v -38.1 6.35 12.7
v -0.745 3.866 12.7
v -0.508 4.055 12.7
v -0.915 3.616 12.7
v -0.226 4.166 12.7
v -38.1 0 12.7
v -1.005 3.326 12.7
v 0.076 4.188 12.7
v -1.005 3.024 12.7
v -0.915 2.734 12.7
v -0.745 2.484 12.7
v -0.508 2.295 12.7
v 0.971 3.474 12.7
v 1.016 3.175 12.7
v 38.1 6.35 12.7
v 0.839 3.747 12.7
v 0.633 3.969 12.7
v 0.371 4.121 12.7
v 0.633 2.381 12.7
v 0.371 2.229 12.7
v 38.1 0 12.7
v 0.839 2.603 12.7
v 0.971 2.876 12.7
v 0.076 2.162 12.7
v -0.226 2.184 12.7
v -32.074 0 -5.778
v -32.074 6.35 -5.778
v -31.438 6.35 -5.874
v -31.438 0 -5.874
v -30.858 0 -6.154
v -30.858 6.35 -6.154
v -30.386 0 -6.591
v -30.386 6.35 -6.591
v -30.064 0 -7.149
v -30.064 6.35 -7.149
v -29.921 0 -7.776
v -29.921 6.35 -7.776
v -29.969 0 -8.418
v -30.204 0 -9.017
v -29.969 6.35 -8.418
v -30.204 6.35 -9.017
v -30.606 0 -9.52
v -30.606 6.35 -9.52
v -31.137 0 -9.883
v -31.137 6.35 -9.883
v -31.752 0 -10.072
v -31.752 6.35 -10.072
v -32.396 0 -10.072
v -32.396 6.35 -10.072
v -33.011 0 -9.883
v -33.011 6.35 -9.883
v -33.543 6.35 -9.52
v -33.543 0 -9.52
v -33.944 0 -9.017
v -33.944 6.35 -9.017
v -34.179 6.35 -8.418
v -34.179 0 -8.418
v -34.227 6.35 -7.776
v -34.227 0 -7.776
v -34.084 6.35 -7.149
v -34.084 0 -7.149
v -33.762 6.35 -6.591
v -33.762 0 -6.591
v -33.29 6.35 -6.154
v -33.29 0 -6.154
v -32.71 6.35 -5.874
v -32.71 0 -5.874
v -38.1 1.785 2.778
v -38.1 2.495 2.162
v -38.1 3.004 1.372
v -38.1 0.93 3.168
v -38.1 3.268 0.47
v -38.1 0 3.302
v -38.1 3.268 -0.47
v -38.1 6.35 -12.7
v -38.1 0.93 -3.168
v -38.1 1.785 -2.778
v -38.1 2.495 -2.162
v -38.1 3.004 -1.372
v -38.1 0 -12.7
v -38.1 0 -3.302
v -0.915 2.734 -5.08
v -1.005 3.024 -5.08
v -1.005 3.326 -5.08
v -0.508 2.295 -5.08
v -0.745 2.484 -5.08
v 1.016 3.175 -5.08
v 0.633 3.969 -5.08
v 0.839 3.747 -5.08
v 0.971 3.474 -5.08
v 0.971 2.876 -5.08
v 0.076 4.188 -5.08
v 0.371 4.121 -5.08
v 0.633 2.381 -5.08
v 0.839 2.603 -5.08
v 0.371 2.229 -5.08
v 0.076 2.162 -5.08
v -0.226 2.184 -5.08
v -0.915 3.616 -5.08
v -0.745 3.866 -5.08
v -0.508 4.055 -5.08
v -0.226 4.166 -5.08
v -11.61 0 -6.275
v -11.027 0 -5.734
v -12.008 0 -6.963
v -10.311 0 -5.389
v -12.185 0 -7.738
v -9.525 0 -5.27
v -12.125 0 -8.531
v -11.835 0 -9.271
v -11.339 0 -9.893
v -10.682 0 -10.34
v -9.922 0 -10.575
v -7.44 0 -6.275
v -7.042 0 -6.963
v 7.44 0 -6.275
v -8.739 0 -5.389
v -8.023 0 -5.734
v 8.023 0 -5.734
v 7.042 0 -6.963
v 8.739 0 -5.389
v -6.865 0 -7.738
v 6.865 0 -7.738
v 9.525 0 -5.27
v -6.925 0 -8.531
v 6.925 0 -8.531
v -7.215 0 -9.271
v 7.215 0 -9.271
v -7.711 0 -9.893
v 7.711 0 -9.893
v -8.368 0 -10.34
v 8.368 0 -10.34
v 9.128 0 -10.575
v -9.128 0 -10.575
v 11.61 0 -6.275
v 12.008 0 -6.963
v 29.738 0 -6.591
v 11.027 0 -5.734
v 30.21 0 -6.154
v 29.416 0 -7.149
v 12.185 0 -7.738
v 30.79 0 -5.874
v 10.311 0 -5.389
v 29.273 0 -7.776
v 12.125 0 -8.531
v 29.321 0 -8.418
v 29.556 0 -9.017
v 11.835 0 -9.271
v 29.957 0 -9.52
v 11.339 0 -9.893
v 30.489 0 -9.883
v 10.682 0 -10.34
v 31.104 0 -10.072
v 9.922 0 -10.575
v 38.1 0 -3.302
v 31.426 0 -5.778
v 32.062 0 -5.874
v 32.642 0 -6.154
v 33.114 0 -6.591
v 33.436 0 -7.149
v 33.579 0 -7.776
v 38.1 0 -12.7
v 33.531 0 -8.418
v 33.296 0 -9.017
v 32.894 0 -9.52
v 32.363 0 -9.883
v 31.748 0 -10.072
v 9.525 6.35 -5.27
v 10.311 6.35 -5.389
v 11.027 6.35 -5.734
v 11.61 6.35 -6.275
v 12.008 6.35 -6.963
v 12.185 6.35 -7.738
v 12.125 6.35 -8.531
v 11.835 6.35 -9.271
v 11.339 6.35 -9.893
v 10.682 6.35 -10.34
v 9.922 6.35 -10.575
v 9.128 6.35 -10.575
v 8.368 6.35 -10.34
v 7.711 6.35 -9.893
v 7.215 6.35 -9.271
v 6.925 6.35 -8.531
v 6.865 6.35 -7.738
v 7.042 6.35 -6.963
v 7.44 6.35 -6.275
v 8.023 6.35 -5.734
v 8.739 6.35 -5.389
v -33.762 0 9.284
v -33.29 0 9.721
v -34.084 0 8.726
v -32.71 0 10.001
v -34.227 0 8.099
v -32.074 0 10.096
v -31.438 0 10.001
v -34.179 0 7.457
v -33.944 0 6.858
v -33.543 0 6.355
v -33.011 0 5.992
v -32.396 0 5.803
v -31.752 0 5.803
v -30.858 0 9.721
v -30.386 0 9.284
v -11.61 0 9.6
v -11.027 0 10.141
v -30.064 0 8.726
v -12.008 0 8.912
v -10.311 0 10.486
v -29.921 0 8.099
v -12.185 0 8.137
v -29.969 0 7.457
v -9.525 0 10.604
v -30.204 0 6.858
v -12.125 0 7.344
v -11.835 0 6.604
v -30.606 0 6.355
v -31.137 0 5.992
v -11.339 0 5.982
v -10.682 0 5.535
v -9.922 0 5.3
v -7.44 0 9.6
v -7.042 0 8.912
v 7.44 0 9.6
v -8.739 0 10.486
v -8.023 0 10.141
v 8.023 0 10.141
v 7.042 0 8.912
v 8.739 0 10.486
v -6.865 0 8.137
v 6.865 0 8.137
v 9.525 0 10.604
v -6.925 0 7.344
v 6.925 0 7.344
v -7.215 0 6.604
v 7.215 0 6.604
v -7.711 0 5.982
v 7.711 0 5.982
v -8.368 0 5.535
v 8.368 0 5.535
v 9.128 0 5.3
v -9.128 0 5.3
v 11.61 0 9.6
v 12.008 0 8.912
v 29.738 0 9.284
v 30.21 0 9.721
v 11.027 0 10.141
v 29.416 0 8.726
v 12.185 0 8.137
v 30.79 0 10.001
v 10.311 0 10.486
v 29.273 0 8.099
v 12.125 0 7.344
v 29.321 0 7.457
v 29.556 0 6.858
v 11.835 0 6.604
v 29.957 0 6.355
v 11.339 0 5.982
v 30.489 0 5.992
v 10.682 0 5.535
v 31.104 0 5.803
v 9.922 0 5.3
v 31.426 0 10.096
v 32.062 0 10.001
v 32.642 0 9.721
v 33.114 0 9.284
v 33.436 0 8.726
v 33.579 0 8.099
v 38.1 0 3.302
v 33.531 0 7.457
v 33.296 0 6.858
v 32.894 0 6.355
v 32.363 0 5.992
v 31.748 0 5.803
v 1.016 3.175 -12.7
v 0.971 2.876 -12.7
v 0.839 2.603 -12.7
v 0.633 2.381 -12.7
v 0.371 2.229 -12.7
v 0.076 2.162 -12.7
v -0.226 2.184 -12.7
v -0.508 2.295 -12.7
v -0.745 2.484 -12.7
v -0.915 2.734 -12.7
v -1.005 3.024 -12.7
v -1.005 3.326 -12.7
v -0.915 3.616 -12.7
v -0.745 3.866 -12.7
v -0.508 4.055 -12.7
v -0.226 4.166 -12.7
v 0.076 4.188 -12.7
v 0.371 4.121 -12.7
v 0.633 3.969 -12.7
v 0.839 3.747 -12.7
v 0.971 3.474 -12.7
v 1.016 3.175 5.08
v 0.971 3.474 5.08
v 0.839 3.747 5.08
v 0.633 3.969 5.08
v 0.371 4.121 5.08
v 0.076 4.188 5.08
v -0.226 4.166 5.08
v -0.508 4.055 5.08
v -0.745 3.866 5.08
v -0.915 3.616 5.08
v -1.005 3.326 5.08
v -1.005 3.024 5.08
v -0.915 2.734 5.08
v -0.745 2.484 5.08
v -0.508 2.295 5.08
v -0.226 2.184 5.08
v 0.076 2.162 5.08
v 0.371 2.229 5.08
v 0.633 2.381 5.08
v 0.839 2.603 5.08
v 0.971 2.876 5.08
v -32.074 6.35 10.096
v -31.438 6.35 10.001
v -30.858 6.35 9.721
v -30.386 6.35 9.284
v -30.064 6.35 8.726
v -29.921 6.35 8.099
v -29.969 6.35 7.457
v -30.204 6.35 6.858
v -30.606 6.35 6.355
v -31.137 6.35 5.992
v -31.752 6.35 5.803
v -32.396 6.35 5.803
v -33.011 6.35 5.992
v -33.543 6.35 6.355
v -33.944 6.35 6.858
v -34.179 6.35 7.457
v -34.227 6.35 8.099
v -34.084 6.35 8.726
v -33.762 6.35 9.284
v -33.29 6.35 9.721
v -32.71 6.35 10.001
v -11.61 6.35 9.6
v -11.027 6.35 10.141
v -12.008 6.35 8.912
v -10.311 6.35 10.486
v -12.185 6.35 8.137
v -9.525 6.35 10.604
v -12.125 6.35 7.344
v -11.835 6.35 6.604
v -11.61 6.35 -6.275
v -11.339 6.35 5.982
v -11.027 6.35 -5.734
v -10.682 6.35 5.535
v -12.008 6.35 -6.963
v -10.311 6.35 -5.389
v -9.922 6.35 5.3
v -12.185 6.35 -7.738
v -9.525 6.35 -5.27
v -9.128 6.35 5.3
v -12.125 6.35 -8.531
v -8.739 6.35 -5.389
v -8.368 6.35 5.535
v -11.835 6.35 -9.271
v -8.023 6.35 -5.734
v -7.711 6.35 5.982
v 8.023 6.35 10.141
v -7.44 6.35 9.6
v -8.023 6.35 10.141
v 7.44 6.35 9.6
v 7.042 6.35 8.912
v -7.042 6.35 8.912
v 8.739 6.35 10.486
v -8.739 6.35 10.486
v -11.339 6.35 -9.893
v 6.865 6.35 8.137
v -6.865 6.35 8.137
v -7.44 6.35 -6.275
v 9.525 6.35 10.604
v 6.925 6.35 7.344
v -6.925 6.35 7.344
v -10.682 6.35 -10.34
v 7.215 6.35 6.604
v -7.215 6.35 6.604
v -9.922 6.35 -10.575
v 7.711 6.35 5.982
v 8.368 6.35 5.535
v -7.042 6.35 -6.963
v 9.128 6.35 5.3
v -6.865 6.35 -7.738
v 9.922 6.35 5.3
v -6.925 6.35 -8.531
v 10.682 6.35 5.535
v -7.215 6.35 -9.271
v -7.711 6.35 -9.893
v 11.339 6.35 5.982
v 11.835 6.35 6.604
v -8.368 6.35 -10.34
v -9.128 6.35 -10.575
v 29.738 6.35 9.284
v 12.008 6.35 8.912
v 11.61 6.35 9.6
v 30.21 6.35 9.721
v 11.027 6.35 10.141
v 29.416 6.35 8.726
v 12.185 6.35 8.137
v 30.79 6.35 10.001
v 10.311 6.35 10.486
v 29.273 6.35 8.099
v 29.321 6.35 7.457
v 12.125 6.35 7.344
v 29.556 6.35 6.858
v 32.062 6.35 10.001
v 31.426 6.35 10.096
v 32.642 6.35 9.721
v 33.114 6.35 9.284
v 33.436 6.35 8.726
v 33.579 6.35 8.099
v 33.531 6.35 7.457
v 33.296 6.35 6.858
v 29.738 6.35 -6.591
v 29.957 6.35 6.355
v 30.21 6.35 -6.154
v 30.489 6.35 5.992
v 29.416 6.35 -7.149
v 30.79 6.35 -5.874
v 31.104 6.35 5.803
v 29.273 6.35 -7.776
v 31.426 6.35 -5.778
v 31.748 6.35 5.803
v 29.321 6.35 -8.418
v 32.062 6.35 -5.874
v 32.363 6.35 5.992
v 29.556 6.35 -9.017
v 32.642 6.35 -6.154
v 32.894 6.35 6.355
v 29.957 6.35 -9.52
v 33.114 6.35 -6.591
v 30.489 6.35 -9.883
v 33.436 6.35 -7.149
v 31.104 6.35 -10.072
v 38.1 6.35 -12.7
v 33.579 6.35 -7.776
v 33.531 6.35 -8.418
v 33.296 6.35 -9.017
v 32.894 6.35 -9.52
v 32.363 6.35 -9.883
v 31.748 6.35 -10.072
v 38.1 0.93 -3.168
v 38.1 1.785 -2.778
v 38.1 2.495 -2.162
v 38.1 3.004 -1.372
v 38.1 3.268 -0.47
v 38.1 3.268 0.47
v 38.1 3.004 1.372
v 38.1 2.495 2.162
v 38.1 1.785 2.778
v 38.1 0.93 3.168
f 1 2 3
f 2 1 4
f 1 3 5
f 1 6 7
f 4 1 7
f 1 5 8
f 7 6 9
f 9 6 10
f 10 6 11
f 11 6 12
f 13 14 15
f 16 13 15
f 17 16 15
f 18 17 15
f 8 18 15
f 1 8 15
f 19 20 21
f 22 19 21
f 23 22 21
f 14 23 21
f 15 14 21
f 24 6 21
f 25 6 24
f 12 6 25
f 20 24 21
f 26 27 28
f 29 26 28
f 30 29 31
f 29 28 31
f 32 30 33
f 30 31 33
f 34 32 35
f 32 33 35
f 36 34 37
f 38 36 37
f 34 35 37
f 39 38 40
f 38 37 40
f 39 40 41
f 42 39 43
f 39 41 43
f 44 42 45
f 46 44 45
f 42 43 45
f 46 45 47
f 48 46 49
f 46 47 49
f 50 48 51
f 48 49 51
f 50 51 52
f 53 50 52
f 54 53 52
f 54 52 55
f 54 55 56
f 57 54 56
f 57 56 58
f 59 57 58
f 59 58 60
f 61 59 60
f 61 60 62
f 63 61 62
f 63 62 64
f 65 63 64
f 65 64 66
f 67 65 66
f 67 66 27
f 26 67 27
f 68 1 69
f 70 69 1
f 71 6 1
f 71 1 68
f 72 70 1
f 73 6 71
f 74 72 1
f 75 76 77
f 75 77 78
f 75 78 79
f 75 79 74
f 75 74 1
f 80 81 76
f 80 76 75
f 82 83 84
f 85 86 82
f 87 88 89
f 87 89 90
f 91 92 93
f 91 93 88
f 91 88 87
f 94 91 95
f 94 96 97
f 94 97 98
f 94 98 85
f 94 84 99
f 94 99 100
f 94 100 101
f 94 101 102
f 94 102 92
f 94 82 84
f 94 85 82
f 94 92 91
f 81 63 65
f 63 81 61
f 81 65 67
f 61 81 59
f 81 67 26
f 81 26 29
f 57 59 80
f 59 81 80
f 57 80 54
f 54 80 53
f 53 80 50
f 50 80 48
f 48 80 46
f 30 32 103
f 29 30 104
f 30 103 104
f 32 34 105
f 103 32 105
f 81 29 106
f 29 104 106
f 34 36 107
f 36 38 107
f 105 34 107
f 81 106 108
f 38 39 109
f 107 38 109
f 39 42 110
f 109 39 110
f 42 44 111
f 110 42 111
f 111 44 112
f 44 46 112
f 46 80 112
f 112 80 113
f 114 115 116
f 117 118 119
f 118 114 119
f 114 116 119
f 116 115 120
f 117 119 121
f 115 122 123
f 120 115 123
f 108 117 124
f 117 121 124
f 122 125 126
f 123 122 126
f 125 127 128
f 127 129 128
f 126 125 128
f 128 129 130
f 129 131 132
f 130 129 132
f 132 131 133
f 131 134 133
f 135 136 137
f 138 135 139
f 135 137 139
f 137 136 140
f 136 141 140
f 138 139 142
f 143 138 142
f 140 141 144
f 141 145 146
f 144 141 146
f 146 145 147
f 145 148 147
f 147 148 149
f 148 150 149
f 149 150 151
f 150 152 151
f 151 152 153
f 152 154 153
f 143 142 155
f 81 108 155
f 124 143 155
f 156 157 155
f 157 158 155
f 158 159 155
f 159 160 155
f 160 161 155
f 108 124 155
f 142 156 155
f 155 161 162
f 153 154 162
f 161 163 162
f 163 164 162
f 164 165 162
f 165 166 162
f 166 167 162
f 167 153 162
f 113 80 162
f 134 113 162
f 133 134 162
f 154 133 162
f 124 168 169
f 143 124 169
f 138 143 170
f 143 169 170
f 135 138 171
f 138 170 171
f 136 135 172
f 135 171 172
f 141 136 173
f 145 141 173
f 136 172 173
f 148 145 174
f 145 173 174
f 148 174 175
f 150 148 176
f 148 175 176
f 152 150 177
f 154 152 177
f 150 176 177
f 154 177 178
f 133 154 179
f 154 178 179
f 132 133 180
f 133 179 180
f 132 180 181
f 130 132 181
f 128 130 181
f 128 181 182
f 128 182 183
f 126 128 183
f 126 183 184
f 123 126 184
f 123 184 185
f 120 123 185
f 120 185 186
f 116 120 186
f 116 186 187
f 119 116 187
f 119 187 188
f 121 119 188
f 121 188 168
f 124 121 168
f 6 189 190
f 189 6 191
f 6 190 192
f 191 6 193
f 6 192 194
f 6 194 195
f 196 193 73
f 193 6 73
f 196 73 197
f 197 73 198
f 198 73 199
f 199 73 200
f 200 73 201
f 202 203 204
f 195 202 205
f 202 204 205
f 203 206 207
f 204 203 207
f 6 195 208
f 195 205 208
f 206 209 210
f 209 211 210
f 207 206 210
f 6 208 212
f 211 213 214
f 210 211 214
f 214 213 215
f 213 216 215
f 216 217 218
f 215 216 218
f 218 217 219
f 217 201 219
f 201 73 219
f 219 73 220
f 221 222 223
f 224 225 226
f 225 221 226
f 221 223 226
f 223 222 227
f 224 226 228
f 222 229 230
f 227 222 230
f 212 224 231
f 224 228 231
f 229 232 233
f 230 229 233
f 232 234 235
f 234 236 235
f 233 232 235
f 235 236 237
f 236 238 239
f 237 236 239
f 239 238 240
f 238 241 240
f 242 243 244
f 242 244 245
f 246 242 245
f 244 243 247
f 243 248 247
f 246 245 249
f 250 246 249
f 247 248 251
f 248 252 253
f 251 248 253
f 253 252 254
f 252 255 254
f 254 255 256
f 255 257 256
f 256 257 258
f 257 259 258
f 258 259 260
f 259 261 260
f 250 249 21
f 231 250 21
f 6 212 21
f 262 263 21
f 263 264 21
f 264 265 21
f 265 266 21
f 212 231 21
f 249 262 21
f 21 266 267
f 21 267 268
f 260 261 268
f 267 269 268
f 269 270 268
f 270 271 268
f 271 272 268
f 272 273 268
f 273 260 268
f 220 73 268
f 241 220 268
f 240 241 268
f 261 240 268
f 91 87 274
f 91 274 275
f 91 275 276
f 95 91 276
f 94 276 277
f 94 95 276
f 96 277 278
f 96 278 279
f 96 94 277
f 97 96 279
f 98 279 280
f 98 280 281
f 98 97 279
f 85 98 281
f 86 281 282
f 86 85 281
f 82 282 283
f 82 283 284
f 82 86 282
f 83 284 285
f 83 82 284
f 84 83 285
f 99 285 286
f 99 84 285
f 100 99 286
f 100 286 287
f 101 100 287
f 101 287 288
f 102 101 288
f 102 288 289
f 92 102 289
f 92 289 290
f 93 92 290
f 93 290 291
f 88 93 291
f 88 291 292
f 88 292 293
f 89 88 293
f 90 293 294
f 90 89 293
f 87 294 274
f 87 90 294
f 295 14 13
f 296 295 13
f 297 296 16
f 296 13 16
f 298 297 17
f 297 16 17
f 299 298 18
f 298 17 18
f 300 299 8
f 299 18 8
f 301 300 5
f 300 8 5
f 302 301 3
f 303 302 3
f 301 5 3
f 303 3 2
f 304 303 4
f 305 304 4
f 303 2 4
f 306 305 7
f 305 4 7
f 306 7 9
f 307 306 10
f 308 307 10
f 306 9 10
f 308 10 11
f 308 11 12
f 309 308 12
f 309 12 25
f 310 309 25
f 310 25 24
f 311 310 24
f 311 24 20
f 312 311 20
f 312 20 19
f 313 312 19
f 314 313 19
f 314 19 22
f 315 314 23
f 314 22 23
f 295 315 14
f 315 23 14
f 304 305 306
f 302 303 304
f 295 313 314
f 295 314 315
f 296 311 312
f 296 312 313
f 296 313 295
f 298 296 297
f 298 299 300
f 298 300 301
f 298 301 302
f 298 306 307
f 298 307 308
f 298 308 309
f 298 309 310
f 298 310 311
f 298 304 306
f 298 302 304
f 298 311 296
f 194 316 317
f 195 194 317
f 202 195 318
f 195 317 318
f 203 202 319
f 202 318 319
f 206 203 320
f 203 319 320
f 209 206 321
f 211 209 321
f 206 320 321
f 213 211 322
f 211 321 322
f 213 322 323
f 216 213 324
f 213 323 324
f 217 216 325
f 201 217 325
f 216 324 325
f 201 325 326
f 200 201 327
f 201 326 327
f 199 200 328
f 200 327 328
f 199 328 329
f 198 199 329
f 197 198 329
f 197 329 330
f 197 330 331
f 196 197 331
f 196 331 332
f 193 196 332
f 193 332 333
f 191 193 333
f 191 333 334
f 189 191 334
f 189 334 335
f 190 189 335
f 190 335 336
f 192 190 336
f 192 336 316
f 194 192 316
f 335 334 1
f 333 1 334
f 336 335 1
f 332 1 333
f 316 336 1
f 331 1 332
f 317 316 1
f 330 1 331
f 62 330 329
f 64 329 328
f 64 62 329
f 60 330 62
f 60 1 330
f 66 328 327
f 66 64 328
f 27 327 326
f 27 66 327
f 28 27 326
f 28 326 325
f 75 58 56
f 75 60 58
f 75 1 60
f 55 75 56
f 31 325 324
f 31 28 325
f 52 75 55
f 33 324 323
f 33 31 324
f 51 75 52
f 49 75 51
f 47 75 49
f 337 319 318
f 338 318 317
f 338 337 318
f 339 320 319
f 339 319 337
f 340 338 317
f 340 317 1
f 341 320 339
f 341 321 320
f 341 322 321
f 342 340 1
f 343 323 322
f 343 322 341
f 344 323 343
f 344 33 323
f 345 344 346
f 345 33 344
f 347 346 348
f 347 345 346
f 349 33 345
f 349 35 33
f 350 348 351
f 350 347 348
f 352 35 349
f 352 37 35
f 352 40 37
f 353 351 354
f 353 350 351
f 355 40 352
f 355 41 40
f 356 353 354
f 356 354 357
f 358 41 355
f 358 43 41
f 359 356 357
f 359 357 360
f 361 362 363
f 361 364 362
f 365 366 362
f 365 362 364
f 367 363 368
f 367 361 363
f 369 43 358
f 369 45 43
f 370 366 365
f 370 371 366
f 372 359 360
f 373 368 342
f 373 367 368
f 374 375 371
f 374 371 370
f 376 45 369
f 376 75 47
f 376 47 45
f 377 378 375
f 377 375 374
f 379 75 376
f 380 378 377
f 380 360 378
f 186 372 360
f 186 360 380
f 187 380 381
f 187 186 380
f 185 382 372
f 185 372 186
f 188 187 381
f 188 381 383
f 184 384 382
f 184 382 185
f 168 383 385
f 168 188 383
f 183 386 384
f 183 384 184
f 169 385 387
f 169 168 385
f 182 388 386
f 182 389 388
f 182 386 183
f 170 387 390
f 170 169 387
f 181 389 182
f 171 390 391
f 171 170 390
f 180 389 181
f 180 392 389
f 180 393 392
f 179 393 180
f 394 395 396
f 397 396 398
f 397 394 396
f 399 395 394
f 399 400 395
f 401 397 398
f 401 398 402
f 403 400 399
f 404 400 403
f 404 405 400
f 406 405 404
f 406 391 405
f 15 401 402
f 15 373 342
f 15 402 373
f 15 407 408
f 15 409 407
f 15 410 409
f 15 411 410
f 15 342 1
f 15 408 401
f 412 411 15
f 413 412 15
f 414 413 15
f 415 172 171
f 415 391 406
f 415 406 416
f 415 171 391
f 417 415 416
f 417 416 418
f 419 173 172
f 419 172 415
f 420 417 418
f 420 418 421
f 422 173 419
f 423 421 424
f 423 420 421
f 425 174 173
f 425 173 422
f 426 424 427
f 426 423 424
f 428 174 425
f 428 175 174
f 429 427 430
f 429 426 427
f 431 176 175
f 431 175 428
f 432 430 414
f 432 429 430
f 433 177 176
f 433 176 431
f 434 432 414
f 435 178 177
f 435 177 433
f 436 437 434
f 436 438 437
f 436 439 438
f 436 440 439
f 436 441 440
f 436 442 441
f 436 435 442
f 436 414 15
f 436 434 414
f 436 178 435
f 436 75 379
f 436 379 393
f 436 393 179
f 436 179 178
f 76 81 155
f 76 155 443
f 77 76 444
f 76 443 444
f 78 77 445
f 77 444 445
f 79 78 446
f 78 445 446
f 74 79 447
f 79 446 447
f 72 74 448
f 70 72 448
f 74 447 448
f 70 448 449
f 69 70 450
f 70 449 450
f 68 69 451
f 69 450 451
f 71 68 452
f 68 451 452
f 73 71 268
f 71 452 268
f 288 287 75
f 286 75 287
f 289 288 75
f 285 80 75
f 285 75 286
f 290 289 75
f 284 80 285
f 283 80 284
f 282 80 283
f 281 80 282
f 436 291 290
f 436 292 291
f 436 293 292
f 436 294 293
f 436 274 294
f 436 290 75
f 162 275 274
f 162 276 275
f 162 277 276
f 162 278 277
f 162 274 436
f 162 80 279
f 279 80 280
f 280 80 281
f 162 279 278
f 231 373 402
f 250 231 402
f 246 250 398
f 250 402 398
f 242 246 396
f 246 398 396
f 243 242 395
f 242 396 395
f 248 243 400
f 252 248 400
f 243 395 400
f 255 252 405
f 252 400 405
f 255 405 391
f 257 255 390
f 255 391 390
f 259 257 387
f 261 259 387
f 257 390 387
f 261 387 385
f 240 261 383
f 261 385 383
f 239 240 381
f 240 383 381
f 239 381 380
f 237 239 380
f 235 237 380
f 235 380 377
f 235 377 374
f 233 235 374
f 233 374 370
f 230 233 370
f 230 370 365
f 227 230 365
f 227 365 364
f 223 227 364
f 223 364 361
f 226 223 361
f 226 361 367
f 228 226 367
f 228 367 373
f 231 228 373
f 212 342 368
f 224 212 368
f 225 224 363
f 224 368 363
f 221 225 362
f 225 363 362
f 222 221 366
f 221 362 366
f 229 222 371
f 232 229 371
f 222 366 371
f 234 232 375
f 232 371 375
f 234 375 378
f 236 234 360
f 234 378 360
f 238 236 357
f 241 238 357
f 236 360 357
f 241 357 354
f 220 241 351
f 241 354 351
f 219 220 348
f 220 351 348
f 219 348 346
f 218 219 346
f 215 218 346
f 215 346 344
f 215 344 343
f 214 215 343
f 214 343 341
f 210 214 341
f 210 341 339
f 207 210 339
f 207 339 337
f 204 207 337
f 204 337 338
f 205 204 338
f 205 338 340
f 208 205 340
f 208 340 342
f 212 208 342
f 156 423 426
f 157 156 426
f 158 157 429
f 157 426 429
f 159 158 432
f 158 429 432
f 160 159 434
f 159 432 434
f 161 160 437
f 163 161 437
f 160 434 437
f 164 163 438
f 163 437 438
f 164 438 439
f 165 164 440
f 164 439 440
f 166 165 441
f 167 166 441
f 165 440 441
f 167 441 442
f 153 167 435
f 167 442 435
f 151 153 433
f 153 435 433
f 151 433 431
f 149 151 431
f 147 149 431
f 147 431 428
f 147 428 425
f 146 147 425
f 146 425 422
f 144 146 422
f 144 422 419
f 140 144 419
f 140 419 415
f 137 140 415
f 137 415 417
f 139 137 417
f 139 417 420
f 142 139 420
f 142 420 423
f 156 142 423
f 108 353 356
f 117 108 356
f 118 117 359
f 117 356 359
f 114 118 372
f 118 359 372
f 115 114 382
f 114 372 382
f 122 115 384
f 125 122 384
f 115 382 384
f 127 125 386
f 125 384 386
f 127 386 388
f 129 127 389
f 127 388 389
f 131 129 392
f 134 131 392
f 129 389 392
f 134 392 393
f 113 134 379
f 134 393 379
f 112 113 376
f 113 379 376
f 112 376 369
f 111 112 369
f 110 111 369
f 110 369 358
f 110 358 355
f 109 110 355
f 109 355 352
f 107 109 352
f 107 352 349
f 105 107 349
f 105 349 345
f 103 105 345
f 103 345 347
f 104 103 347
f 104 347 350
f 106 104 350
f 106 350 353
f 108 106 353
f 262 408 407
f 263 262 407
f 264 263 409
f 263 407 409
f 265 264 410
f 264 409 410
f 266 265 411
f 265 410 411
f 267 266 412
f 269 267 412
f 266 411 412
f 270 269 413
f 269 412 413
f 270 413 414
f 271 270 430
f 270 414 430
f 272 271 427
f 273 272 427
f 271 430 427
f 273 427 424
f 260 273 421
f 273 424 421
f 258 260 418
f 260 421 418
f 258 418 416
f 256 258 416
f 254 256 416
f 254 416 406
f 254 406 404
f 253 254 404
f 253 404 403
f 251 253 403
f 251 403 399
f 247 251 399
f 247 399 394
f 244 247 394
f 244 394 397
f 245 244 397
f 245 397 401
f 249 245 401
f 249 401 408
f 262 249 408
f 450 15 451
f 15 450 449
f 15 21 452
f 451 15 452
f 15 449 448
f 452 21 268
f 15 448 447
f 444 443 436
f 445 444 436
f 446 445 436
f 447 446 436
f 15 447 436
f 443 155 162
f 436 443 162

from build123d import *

# Parameters (mm, degrees)
SKETCH1_W           = 76.2
SKETCH1_H           = 25.4
BOSS_EXTRUDE1_DEPTH = 6.35
SKETCH2_R           = 2.159
CUT_EXTRUDE1_DEPTH  = 41.659838908
SKETCH3_R           = 2.667
CUT_EXTRUDE2_DEPTH  = 41.659838908
SKETCH4_R           = 1.016
CUT_EXTRUDE3_DEPTH  = 7.62
CUT_EXTRUDE4_START  = -7.62
SKETCH5_R           = 1.016
CUT_EXTRUDE4_DEPTH  = 7.62
SKETCH7_R           = 3.302
CUT_EXTRUDE5_DEPTH  = 78.51162816


with BuildPart() as part:
    # Sketch1 → Boss-Extrude1 (new body)
    with BuildSketch(Plane(origin=(0, 0, 0), x_dir=(1, 0, 0), z_dir=(0, 1, 0))):
        Rectangle(SKETCH1_W, SKETCH1_H)
    extrude(amount=BOSS_EXTRUDE1_DEPTH)

    # Sketch2 → Cut-Extrude1 (cut, through all)
    with BuildSketch(Plane(origin=(0, 6.35, 0), x_dir=(1, 0, 0), z_dir=(0, 1, 0))):
        with Locations(Location((-32.074075882, 7.9375, 0), (0, 0, 270))):
            Circle(SKETCH2_R)
        with Locations(Location((-32.074075882, -7.9375, 0), (0, 0, 270))):
            Circle(SKETCH2_R)
        with Locations(Location((31.425924118, 7.9375, 0), (0, 0, 270))):
            Circle(SKETCH2_R)
        with Locations(Location((31.425924118, -7.9375, 0), (0, 0, 270))):
            Circle(SKETCH2_R)
    extrude(amount=-CUT_EXTRUDE1_DEPTH, mode=Mode.SUBTRACT)

    # Sketch3 → Cut-Extrude2 (cut, through all)
    with BuildSketch(Plane(origin=(0, 6.35, 0), x_dir=(1, 0, 0), z_dir=(0, 1, 0))):
        with Locations(Location((-9.525, 7.9375, 0), (0, 0, 270))):
            Circle(SKETCH3_R)
        with Locations(Location((-9.525, -7.9375, 0), (0, 0, 270))):
            Circle(SKETCH3_R)
        with Locations(Location((9.525, 7.9375, 0), (0, 0, 270))):
            Circle(SKETCH3_R)
        with Locations(Location((9.525, -7.9375, 0), (0, 0, 270))):
            Circle(SKETCH3_R)
    extrude(amount=-CUT_EXTRUDE2_DEPTH, mode=Mode.SUBTRACT)

    # Sketch4 → Cut-Extrude3 (cut)
    with BuildSketch(Plane.XY.offset(12.7)):
        with Locations((0, 3.175)):
            Circle(SKETCH4_R)
    extrude(amount=-CUT_EXTRUDE3_DEPTH, mode=Mode.SUBTRACT)

    # Sketch5 → Cut-Extrude4 (cut)
    with BuildSketch(Plane(origin=(0, 0, -12.7), x_dir=(-1, 0, 0), z_dir=(0, 0, -1)).offset(CUT_EXTRUDE4_START)):
        with Locations(Location((0, 3.175, 0), (0, 0, 180))):
            Circle(SKETCH5_R)
    extrude(amount=CUT_EXTRUDE4_DEPTH, mode=Mode.SUBTRACT)

    # Sketch7 → Cut-Extrude5 (cut, through all)
    with BuildSketch(Plane(origin=(38.1, 0, 0), x_dir=(0, 0, -1), z_dir=(1, 0, 0))):
        Circle(SKETCH7_R)
    extrude(amount=-CUT_EXTRUDE5_DEPTH, mode=Mode.SUBTRACT)


solid = part.part
